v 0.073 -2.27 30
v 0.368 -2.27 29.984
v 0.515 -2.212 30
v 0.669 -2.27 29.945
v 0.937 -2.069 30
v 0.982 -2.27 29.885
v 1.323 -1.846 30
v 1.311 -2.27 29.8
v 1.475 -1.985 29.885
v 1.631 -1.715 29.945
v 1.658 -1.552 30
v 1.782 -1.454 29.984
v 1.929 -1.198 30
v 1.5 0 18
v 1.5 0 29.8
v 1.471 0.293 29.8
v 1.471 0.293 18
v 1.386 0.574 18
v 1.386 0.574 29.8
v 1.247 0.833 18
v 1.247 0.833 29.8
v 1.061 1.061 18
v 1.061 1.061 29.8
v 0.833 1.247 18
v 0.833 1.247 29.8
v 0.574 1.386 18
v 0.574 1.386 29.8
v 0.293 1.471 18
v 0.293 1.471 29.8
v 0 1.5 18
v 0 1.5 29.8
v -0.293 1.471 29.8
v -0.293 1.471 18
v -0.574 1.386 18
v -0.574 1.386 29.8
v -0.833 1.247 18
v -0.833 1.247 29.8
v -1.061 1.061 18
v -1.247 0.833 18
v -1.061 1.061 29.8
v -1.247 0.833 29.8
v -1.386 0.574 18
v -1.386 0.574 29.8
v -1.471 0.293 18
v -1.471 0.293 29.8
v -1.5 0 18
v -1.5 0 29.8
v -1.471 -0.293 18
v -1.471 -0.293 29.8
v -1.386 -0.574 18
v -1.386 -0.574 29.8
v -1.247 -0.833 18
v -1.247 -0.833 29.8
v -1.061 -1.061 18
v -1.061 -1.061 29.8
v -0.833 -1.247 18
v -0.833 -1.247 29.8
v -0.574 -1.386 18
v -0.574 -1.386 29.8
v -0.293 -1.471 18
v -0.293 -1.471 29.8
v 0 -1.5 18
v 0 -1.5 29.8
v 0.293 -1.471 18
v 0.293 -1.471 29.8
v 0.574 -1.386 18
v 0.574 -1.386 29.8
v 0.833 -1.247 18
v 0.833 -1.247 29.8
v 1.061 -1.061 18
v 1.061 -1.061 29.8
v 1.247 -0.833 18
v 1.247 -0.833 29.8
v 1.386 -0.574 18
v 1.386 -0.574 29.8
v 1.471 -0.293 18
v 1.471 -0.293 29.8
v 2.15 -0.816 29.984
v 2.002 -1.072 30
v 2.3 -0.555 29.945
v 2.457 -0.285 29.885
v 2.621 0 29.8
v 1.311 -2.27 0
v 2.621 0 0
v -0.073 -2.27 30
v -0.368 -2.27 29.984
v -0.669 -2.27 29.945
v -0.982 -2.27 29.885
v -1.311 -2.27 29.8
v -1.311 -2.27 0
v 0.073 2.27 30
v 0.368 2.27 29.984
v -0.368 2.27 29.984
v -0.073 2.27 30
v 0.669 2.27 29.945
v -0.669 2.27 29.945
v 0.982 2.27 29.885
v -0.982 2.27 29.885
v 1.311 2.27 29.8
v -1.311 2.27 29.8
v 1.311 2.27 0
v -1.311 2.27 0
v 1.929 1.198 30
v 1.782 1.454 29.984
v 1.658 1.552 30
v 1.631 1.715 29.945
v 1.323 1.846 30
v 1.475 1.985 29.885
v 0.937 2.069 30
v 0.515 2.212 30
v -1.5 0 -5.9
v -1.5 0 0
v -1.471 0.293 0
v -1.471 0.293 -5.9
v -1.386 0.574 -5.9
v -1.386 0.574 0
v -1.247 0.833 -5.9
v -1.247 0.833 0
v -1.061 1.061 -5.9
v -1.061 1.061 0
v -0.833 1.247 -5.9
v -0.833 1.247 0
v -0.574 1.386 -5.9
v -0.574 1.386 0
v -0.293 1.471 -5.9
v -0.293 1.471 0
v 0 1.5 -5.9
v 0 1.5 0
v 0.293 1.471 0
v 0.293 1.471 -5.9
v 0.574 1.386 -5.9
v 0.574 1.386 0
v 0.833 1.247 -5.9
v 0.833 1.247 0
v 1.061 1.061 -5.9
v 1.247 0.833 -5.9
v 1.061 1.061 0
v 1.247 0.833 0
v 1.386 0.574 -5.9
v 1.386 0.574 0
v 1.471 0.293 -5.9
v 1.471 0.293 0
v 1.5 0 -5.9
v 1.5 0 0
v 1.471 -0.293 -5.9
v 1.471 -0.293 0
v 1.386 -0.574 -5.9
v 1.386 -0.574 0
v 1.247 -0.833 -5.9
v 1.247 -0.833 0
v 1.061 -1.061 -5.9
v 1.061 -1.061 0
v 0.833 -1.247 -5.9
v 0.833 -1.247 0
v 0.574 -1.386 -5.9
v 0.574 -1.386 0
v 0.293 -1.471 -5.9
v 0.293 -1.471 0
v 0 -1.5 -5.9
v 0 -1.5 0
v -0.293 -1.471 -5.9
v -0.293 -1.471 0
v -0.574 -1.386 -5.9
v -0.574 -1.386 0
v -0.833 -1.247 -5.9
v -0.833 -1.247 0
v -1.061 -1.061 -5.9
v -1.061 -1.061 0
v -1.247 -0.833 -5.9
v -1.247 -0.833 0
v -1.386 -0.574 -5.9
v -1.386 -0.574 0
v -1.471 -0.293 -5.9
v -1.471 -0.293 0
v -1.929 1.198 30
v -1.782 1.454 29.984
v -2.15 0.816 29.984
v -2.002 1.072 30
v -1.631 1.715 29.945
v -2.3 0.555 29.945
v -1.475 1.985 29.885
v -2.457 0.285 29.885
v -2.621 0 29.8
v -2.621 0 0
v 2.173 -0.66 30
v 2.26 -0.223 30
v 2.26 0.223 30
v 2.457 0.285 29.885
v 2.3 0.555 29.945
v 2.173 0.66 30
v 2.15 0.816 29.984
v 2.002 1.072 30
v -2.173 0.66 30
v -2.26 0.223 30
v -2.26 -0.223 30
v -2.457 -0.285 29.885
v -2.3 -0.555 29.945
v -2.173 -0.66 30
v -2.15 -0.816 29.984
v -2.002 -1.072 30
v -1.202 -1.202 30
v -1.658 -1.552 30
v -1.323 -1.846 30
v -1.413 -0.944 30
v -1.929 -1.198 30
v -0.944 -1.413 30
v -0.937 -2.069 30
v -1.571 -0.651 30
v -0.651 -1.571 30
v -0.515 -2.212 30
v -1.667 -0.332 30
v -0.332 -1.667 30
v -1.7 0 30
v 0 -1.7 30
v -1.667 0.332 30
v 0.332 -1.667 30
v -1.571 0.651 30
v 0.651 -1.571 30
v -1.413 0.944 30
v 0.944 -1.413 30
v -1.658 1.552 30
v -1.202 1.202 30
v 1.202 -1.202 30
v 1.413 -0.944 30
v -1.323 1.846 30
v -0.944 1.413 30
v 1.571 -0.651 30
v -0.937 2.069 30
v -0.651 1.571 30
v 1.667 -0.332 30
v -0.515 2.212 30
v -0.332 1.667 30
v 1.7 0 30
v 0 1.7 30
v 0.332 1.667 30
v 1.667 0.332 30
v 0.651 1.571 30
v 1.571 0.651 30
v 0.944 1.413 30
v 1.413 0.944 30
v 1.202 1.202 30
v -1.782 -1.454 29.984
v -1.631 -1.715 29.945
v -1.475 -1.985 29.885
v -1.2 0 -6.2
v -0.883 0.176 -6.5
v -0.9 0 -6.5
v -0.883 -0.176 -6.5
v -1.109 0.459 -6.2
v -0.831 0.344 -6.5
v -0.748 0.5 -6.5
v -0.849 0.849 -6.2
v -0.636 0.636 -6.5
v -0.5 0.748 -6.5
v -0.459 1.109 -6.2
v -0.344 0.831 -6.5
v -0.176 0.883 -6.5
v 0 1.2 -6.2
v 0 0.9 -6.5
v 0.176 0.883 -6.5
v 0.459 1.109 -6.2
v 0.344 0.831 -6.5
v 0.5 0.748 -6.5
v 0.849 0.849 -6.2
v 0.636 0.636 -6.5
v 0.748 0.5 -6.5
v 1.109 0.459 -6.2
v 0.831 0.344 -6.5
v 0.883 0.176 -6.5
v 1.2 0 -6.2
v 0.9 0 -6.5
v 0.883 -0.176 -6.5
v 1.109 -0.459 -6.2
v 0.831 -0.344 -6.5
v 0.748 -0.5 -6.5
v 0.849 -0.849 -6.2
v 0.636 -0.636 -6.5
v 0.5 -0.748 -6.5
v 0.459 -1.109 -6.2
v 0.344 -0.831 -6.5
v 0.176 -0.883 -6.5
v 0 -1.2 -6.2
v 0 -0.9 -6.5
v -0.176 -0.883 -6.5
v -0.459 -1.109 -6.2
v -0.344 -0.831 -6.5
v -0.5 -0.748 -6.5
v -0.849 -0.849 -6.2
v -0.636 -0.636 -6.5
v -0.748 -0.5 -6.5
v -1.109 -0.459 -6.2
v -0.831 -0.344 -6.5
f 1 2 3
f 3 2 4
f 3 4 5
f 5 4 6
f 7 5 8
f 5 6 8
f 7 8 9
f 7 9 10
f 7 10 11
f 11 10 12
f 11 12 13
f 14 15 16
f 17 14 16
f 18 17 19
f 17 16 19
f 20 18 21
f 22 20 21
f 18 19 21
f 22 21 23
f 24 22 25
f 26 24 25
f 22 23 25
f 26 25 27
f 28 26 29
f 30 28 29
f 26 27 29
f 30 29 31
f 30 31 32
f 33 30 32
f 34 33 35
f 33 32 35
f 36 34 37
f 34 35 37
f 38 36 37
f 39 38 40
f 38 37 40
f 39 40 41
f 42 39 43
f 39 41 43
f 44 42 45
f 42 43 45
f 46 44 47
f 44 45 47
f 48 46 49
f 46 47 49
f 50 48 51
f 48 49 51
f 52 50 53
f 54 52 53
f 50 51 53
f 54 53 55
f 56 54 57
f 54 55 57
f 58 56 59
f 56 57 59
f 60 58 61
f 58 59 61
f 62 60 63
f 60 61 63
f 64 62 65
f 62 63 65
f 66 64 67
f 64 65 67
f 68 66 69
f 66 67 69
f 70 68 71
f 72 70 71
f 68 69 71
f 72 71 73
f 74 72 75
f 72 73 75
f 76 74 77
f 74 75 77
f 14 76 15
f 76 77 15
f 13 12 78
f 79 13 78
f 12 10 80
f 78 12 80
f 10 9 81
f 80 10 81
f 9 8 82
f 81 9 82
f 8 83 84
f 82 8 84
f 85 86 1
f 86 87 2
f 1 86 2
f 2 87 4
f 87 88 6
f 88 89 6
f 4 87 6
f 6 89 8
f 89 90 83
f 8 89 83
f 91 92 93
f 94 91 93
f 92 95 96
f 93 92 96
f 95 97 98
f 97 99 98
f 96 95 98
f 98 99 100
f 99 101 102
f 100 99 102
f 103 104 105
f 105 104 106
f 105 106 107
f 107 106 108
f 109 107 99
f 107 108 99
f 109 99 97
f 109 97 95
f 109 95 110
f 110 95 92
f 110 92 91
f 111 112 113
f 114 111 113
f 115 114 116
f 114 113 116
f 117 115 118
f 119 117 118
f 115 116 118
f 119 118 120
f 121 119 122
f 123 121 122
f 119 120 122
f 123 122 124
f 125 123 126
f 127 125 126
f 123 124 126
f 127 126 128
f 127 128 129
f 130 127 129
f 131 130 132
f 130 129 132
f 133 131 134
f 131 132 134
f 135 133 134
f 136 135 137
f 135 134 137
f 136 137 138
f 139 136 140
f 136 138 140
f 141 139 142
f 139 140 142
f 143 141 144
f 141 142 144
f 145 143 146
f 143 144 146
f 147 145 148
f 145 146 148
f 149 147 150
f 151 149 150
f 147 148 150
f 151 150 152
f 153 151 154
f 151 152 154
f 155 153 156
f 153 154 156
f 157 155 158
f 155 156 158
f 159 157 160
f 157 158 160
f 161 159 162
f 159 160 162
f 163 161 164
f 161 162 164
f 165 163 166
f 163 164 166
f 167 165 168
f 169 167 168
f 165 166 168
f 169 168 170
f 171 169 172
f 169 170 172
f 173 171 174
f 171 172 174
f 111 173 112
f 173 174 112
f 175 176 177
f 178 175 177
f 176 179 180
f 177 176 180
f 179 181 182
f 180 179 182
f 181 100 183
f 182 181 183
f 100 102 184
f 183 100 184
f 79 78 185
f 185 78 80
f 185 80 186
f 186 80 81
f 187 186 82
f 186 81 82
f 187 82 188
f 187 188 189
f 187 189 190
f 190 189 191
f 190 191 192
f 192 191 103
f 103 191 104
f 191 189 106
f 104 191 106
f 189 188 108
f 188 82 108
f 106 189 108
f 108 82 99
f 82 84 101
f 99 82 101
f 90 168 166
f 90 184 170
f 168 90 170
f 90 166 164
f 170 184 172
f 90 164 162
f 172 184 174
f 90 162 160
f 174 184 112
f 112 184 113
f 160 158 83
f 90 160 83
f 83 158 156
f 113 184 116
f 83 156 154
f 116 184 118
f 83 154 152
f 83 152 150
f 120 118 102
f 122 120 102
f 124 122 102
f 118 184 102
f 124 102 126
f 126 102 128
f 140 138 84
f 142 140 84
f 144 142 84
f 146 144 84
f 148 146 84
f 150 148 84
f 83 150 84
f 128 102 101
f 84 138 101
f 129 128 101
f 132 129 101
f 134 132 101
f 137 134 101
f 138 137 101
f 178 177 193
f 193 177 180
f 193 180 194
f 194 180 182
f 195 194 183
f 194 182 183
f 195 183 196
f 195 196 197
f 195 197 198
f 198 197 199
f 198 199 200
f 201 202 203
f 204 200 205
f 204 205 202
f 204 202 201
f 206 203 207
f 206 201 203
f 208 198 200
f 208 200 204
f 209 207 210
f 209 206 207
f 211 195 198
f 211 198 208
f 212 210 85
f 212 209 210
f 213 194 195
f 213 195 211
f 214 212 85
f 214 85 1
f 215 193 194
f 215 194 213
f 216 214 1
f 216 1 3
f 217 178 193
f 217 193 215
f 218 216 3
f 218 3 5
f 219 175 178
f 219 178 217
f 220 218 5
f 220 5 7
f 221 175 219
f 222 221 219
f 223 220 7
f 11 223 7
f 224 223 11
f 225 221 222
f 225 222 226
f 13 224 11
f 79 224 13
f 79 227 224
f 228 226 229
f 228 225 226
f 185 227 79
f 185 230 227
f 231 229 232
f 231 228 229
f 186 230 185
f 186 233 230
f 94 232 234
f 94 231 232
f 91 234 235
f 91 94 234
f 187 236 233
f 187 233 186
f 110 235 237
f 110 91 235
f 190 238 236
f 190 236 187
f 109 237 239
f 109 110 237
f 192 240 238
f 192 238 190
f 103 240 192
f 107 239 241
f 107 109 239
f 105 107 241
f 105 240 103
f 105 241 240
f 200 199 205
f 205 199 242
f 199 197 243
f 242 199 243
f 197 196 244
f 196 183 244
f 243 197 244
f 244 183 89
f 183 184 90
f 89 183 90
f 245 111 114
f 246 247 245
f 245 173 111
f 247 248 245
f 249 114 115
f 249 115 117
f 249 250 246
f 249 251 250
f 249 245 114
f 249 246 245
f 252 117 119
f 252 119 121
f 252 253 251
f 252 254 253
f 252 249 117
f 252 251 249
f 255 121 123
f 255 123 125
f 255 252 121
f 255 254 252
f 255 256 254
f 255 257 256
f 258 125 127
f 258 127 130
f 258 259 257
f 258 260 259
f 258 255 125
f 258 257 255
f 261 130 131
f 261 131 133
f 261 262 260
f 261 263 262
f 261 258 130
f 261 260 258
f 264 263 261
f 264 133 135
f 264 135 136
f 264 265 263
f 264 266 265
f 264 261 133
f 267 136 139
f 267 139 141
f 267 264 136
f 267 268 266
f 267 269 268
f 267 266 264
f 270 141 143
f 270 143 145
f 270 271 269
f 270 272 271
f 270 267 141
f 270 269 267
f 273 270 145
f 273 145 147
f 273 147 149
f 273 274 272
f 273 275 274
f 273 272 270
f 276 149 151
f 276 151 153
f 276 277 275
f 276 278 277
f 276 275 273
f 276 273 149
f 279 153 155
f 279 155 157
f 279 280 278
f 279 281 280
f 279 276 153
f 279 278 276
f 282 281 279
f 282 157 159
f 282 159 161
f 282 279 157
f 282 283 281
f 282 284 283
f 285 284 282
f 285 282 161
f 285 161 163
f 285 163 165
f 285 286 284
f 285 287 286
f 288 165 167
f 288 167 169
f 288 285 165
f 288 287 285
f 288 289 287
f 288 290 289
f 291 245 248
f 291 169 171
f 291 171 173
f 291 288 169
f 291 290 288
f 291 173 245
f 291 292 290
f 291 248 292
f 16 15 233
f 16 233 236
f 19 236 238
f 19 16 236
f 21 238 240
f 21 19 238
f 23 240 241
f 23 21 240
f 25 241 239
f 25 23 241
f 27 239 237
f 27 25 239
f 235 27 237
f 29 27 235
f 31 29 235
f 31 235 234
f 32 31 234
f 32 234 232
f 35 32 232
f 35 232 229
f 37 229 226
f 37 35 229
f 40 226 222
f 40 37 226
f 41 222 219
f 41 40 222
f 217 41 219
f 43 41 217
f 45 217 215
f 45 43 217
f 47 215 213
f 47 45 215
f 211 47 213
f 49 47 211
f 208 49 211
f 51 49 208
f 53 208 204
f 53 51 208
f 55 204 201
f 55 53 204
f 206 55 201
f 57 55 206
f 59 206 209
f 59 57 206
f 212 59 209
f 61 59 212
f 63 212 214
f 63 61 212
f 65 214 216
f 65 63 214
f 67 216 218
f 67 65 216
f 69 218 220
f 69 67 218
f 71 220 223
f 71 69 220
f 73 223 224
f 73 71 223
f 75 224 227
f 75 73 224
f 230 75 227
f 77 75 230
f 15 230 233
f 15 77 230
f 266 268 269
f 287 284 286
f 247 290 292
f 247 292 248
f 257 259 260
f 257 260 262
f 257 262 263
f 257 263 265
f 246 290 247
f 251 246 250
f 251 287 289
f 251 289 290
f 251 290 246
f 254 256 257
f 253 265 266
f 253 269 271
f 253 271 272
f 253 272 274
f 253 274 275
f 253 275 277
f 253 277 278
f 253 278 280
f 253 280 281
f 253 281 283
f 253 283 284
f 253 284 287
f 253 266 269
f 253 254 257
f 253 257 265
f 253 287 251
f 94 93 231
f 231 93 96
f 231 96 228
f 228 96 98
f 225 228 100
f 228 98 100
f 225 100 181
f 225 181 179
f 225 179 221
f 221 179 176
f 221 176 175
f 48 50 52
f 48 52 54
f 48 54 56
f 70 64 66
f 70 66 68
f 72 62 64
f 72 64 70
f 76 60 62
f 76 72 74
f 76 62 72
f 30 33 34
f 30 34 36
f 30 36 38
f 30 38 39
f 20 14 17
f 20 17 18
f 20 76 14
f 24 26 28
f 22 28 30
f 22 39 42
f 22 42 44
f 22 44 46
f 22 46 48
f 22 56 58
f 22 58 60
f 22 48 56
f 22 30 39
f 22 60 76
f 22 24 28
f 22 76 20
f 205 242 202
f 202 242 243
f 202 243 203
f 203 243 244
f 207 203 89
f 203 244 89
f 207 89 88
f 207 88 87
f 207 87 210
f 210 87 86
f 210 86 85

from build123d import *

# Parameters (mm, degrees)
BOSS_EXTRUDE1_DEPTH     = 30
SKETCH2_R               = 1.5
CUT_EXTRUDE1_DEPTH      = 1
CUT_EXTRUDE1_DEPTH_BACK = 12
CHAMFER1_SIZE           = 0.2
SKETCH4_R               = 1.5
BOSS_EXTRUDE2_DEPTH     = 6.5
CHAMFER2_SIZE           = 0.6


with BuildPart() as part:
    # Sketch1 → Boss-Extrude1 (new body)
    with BuildSketch(Plane.XY):
        Polygon((2.621170222, 0), (1.310585111, 2.27), (-1.310585111, 2.27), (-2.621170222, 0), (-1.310585111, -2.27), (1.310585111, -2.27), align=None)
    extrude(amount=BOSS_EXTRUDE1_DEPTH)

    # Sketch2 → Cut-Extrude1 (cut, two sides)
    with BuildSketch(Plane.XY.offset(30)) as cut_extrude1_sk:
        Circle(SKETCH2_R)
    extrude(amount=CUT_EXTRUDE1_DEPTH, mode=Mode.SUBTRACT)
    extrude(cut_extrude1_sk.sketch, amount=-CUT_EXTRUDE1_DEPTH_BACK, mode=Mode.SUBTRACT)

    # Sketch3 → Cut-Revolve1 (revolve, cut)
    with BuildSketch(Plane(origin=(0, 0, 0), x_dir=(1, 0, 0), z_dir=(0, 1, 0))):
        Polygon((-2.621170222, -30), (-2.271170222, -30), (-2.621170222, -29.8), align=None)
    revolve(axis=Axis((0, 0, 18), (0, 0, 1)), mode=Mode.SUBTRACT)

    # Chamfer1
    chamfer1_edges = [part.edges().sort_by_distance(p)[0] for p in [
        (-1.5, 0, 30),
    ]]
    chamfer(chamfer1_edges, length=CHAMFER1_SIZE)

    # Sketch4 → Boss-Extrude2 (add)
    with BuildSketch(Plane(origin=(0, 0, 0), x_dir=(-1, 0, 0), z_dir=(0, 0, -1))):
        Circle(SKETCH4_R)
    extrude(amount=BOSS_EXTRUDE2_DEPTH)

    # Chamfer2
    chamfer2_edges = [part.edges().sort_by_distance(p)[0] for p in [
        (1.5, 0, -6.5),
    ]]
    chamfer(chamfer2_edges, length=CHAMFER2_SIZE)


solid = part.part
